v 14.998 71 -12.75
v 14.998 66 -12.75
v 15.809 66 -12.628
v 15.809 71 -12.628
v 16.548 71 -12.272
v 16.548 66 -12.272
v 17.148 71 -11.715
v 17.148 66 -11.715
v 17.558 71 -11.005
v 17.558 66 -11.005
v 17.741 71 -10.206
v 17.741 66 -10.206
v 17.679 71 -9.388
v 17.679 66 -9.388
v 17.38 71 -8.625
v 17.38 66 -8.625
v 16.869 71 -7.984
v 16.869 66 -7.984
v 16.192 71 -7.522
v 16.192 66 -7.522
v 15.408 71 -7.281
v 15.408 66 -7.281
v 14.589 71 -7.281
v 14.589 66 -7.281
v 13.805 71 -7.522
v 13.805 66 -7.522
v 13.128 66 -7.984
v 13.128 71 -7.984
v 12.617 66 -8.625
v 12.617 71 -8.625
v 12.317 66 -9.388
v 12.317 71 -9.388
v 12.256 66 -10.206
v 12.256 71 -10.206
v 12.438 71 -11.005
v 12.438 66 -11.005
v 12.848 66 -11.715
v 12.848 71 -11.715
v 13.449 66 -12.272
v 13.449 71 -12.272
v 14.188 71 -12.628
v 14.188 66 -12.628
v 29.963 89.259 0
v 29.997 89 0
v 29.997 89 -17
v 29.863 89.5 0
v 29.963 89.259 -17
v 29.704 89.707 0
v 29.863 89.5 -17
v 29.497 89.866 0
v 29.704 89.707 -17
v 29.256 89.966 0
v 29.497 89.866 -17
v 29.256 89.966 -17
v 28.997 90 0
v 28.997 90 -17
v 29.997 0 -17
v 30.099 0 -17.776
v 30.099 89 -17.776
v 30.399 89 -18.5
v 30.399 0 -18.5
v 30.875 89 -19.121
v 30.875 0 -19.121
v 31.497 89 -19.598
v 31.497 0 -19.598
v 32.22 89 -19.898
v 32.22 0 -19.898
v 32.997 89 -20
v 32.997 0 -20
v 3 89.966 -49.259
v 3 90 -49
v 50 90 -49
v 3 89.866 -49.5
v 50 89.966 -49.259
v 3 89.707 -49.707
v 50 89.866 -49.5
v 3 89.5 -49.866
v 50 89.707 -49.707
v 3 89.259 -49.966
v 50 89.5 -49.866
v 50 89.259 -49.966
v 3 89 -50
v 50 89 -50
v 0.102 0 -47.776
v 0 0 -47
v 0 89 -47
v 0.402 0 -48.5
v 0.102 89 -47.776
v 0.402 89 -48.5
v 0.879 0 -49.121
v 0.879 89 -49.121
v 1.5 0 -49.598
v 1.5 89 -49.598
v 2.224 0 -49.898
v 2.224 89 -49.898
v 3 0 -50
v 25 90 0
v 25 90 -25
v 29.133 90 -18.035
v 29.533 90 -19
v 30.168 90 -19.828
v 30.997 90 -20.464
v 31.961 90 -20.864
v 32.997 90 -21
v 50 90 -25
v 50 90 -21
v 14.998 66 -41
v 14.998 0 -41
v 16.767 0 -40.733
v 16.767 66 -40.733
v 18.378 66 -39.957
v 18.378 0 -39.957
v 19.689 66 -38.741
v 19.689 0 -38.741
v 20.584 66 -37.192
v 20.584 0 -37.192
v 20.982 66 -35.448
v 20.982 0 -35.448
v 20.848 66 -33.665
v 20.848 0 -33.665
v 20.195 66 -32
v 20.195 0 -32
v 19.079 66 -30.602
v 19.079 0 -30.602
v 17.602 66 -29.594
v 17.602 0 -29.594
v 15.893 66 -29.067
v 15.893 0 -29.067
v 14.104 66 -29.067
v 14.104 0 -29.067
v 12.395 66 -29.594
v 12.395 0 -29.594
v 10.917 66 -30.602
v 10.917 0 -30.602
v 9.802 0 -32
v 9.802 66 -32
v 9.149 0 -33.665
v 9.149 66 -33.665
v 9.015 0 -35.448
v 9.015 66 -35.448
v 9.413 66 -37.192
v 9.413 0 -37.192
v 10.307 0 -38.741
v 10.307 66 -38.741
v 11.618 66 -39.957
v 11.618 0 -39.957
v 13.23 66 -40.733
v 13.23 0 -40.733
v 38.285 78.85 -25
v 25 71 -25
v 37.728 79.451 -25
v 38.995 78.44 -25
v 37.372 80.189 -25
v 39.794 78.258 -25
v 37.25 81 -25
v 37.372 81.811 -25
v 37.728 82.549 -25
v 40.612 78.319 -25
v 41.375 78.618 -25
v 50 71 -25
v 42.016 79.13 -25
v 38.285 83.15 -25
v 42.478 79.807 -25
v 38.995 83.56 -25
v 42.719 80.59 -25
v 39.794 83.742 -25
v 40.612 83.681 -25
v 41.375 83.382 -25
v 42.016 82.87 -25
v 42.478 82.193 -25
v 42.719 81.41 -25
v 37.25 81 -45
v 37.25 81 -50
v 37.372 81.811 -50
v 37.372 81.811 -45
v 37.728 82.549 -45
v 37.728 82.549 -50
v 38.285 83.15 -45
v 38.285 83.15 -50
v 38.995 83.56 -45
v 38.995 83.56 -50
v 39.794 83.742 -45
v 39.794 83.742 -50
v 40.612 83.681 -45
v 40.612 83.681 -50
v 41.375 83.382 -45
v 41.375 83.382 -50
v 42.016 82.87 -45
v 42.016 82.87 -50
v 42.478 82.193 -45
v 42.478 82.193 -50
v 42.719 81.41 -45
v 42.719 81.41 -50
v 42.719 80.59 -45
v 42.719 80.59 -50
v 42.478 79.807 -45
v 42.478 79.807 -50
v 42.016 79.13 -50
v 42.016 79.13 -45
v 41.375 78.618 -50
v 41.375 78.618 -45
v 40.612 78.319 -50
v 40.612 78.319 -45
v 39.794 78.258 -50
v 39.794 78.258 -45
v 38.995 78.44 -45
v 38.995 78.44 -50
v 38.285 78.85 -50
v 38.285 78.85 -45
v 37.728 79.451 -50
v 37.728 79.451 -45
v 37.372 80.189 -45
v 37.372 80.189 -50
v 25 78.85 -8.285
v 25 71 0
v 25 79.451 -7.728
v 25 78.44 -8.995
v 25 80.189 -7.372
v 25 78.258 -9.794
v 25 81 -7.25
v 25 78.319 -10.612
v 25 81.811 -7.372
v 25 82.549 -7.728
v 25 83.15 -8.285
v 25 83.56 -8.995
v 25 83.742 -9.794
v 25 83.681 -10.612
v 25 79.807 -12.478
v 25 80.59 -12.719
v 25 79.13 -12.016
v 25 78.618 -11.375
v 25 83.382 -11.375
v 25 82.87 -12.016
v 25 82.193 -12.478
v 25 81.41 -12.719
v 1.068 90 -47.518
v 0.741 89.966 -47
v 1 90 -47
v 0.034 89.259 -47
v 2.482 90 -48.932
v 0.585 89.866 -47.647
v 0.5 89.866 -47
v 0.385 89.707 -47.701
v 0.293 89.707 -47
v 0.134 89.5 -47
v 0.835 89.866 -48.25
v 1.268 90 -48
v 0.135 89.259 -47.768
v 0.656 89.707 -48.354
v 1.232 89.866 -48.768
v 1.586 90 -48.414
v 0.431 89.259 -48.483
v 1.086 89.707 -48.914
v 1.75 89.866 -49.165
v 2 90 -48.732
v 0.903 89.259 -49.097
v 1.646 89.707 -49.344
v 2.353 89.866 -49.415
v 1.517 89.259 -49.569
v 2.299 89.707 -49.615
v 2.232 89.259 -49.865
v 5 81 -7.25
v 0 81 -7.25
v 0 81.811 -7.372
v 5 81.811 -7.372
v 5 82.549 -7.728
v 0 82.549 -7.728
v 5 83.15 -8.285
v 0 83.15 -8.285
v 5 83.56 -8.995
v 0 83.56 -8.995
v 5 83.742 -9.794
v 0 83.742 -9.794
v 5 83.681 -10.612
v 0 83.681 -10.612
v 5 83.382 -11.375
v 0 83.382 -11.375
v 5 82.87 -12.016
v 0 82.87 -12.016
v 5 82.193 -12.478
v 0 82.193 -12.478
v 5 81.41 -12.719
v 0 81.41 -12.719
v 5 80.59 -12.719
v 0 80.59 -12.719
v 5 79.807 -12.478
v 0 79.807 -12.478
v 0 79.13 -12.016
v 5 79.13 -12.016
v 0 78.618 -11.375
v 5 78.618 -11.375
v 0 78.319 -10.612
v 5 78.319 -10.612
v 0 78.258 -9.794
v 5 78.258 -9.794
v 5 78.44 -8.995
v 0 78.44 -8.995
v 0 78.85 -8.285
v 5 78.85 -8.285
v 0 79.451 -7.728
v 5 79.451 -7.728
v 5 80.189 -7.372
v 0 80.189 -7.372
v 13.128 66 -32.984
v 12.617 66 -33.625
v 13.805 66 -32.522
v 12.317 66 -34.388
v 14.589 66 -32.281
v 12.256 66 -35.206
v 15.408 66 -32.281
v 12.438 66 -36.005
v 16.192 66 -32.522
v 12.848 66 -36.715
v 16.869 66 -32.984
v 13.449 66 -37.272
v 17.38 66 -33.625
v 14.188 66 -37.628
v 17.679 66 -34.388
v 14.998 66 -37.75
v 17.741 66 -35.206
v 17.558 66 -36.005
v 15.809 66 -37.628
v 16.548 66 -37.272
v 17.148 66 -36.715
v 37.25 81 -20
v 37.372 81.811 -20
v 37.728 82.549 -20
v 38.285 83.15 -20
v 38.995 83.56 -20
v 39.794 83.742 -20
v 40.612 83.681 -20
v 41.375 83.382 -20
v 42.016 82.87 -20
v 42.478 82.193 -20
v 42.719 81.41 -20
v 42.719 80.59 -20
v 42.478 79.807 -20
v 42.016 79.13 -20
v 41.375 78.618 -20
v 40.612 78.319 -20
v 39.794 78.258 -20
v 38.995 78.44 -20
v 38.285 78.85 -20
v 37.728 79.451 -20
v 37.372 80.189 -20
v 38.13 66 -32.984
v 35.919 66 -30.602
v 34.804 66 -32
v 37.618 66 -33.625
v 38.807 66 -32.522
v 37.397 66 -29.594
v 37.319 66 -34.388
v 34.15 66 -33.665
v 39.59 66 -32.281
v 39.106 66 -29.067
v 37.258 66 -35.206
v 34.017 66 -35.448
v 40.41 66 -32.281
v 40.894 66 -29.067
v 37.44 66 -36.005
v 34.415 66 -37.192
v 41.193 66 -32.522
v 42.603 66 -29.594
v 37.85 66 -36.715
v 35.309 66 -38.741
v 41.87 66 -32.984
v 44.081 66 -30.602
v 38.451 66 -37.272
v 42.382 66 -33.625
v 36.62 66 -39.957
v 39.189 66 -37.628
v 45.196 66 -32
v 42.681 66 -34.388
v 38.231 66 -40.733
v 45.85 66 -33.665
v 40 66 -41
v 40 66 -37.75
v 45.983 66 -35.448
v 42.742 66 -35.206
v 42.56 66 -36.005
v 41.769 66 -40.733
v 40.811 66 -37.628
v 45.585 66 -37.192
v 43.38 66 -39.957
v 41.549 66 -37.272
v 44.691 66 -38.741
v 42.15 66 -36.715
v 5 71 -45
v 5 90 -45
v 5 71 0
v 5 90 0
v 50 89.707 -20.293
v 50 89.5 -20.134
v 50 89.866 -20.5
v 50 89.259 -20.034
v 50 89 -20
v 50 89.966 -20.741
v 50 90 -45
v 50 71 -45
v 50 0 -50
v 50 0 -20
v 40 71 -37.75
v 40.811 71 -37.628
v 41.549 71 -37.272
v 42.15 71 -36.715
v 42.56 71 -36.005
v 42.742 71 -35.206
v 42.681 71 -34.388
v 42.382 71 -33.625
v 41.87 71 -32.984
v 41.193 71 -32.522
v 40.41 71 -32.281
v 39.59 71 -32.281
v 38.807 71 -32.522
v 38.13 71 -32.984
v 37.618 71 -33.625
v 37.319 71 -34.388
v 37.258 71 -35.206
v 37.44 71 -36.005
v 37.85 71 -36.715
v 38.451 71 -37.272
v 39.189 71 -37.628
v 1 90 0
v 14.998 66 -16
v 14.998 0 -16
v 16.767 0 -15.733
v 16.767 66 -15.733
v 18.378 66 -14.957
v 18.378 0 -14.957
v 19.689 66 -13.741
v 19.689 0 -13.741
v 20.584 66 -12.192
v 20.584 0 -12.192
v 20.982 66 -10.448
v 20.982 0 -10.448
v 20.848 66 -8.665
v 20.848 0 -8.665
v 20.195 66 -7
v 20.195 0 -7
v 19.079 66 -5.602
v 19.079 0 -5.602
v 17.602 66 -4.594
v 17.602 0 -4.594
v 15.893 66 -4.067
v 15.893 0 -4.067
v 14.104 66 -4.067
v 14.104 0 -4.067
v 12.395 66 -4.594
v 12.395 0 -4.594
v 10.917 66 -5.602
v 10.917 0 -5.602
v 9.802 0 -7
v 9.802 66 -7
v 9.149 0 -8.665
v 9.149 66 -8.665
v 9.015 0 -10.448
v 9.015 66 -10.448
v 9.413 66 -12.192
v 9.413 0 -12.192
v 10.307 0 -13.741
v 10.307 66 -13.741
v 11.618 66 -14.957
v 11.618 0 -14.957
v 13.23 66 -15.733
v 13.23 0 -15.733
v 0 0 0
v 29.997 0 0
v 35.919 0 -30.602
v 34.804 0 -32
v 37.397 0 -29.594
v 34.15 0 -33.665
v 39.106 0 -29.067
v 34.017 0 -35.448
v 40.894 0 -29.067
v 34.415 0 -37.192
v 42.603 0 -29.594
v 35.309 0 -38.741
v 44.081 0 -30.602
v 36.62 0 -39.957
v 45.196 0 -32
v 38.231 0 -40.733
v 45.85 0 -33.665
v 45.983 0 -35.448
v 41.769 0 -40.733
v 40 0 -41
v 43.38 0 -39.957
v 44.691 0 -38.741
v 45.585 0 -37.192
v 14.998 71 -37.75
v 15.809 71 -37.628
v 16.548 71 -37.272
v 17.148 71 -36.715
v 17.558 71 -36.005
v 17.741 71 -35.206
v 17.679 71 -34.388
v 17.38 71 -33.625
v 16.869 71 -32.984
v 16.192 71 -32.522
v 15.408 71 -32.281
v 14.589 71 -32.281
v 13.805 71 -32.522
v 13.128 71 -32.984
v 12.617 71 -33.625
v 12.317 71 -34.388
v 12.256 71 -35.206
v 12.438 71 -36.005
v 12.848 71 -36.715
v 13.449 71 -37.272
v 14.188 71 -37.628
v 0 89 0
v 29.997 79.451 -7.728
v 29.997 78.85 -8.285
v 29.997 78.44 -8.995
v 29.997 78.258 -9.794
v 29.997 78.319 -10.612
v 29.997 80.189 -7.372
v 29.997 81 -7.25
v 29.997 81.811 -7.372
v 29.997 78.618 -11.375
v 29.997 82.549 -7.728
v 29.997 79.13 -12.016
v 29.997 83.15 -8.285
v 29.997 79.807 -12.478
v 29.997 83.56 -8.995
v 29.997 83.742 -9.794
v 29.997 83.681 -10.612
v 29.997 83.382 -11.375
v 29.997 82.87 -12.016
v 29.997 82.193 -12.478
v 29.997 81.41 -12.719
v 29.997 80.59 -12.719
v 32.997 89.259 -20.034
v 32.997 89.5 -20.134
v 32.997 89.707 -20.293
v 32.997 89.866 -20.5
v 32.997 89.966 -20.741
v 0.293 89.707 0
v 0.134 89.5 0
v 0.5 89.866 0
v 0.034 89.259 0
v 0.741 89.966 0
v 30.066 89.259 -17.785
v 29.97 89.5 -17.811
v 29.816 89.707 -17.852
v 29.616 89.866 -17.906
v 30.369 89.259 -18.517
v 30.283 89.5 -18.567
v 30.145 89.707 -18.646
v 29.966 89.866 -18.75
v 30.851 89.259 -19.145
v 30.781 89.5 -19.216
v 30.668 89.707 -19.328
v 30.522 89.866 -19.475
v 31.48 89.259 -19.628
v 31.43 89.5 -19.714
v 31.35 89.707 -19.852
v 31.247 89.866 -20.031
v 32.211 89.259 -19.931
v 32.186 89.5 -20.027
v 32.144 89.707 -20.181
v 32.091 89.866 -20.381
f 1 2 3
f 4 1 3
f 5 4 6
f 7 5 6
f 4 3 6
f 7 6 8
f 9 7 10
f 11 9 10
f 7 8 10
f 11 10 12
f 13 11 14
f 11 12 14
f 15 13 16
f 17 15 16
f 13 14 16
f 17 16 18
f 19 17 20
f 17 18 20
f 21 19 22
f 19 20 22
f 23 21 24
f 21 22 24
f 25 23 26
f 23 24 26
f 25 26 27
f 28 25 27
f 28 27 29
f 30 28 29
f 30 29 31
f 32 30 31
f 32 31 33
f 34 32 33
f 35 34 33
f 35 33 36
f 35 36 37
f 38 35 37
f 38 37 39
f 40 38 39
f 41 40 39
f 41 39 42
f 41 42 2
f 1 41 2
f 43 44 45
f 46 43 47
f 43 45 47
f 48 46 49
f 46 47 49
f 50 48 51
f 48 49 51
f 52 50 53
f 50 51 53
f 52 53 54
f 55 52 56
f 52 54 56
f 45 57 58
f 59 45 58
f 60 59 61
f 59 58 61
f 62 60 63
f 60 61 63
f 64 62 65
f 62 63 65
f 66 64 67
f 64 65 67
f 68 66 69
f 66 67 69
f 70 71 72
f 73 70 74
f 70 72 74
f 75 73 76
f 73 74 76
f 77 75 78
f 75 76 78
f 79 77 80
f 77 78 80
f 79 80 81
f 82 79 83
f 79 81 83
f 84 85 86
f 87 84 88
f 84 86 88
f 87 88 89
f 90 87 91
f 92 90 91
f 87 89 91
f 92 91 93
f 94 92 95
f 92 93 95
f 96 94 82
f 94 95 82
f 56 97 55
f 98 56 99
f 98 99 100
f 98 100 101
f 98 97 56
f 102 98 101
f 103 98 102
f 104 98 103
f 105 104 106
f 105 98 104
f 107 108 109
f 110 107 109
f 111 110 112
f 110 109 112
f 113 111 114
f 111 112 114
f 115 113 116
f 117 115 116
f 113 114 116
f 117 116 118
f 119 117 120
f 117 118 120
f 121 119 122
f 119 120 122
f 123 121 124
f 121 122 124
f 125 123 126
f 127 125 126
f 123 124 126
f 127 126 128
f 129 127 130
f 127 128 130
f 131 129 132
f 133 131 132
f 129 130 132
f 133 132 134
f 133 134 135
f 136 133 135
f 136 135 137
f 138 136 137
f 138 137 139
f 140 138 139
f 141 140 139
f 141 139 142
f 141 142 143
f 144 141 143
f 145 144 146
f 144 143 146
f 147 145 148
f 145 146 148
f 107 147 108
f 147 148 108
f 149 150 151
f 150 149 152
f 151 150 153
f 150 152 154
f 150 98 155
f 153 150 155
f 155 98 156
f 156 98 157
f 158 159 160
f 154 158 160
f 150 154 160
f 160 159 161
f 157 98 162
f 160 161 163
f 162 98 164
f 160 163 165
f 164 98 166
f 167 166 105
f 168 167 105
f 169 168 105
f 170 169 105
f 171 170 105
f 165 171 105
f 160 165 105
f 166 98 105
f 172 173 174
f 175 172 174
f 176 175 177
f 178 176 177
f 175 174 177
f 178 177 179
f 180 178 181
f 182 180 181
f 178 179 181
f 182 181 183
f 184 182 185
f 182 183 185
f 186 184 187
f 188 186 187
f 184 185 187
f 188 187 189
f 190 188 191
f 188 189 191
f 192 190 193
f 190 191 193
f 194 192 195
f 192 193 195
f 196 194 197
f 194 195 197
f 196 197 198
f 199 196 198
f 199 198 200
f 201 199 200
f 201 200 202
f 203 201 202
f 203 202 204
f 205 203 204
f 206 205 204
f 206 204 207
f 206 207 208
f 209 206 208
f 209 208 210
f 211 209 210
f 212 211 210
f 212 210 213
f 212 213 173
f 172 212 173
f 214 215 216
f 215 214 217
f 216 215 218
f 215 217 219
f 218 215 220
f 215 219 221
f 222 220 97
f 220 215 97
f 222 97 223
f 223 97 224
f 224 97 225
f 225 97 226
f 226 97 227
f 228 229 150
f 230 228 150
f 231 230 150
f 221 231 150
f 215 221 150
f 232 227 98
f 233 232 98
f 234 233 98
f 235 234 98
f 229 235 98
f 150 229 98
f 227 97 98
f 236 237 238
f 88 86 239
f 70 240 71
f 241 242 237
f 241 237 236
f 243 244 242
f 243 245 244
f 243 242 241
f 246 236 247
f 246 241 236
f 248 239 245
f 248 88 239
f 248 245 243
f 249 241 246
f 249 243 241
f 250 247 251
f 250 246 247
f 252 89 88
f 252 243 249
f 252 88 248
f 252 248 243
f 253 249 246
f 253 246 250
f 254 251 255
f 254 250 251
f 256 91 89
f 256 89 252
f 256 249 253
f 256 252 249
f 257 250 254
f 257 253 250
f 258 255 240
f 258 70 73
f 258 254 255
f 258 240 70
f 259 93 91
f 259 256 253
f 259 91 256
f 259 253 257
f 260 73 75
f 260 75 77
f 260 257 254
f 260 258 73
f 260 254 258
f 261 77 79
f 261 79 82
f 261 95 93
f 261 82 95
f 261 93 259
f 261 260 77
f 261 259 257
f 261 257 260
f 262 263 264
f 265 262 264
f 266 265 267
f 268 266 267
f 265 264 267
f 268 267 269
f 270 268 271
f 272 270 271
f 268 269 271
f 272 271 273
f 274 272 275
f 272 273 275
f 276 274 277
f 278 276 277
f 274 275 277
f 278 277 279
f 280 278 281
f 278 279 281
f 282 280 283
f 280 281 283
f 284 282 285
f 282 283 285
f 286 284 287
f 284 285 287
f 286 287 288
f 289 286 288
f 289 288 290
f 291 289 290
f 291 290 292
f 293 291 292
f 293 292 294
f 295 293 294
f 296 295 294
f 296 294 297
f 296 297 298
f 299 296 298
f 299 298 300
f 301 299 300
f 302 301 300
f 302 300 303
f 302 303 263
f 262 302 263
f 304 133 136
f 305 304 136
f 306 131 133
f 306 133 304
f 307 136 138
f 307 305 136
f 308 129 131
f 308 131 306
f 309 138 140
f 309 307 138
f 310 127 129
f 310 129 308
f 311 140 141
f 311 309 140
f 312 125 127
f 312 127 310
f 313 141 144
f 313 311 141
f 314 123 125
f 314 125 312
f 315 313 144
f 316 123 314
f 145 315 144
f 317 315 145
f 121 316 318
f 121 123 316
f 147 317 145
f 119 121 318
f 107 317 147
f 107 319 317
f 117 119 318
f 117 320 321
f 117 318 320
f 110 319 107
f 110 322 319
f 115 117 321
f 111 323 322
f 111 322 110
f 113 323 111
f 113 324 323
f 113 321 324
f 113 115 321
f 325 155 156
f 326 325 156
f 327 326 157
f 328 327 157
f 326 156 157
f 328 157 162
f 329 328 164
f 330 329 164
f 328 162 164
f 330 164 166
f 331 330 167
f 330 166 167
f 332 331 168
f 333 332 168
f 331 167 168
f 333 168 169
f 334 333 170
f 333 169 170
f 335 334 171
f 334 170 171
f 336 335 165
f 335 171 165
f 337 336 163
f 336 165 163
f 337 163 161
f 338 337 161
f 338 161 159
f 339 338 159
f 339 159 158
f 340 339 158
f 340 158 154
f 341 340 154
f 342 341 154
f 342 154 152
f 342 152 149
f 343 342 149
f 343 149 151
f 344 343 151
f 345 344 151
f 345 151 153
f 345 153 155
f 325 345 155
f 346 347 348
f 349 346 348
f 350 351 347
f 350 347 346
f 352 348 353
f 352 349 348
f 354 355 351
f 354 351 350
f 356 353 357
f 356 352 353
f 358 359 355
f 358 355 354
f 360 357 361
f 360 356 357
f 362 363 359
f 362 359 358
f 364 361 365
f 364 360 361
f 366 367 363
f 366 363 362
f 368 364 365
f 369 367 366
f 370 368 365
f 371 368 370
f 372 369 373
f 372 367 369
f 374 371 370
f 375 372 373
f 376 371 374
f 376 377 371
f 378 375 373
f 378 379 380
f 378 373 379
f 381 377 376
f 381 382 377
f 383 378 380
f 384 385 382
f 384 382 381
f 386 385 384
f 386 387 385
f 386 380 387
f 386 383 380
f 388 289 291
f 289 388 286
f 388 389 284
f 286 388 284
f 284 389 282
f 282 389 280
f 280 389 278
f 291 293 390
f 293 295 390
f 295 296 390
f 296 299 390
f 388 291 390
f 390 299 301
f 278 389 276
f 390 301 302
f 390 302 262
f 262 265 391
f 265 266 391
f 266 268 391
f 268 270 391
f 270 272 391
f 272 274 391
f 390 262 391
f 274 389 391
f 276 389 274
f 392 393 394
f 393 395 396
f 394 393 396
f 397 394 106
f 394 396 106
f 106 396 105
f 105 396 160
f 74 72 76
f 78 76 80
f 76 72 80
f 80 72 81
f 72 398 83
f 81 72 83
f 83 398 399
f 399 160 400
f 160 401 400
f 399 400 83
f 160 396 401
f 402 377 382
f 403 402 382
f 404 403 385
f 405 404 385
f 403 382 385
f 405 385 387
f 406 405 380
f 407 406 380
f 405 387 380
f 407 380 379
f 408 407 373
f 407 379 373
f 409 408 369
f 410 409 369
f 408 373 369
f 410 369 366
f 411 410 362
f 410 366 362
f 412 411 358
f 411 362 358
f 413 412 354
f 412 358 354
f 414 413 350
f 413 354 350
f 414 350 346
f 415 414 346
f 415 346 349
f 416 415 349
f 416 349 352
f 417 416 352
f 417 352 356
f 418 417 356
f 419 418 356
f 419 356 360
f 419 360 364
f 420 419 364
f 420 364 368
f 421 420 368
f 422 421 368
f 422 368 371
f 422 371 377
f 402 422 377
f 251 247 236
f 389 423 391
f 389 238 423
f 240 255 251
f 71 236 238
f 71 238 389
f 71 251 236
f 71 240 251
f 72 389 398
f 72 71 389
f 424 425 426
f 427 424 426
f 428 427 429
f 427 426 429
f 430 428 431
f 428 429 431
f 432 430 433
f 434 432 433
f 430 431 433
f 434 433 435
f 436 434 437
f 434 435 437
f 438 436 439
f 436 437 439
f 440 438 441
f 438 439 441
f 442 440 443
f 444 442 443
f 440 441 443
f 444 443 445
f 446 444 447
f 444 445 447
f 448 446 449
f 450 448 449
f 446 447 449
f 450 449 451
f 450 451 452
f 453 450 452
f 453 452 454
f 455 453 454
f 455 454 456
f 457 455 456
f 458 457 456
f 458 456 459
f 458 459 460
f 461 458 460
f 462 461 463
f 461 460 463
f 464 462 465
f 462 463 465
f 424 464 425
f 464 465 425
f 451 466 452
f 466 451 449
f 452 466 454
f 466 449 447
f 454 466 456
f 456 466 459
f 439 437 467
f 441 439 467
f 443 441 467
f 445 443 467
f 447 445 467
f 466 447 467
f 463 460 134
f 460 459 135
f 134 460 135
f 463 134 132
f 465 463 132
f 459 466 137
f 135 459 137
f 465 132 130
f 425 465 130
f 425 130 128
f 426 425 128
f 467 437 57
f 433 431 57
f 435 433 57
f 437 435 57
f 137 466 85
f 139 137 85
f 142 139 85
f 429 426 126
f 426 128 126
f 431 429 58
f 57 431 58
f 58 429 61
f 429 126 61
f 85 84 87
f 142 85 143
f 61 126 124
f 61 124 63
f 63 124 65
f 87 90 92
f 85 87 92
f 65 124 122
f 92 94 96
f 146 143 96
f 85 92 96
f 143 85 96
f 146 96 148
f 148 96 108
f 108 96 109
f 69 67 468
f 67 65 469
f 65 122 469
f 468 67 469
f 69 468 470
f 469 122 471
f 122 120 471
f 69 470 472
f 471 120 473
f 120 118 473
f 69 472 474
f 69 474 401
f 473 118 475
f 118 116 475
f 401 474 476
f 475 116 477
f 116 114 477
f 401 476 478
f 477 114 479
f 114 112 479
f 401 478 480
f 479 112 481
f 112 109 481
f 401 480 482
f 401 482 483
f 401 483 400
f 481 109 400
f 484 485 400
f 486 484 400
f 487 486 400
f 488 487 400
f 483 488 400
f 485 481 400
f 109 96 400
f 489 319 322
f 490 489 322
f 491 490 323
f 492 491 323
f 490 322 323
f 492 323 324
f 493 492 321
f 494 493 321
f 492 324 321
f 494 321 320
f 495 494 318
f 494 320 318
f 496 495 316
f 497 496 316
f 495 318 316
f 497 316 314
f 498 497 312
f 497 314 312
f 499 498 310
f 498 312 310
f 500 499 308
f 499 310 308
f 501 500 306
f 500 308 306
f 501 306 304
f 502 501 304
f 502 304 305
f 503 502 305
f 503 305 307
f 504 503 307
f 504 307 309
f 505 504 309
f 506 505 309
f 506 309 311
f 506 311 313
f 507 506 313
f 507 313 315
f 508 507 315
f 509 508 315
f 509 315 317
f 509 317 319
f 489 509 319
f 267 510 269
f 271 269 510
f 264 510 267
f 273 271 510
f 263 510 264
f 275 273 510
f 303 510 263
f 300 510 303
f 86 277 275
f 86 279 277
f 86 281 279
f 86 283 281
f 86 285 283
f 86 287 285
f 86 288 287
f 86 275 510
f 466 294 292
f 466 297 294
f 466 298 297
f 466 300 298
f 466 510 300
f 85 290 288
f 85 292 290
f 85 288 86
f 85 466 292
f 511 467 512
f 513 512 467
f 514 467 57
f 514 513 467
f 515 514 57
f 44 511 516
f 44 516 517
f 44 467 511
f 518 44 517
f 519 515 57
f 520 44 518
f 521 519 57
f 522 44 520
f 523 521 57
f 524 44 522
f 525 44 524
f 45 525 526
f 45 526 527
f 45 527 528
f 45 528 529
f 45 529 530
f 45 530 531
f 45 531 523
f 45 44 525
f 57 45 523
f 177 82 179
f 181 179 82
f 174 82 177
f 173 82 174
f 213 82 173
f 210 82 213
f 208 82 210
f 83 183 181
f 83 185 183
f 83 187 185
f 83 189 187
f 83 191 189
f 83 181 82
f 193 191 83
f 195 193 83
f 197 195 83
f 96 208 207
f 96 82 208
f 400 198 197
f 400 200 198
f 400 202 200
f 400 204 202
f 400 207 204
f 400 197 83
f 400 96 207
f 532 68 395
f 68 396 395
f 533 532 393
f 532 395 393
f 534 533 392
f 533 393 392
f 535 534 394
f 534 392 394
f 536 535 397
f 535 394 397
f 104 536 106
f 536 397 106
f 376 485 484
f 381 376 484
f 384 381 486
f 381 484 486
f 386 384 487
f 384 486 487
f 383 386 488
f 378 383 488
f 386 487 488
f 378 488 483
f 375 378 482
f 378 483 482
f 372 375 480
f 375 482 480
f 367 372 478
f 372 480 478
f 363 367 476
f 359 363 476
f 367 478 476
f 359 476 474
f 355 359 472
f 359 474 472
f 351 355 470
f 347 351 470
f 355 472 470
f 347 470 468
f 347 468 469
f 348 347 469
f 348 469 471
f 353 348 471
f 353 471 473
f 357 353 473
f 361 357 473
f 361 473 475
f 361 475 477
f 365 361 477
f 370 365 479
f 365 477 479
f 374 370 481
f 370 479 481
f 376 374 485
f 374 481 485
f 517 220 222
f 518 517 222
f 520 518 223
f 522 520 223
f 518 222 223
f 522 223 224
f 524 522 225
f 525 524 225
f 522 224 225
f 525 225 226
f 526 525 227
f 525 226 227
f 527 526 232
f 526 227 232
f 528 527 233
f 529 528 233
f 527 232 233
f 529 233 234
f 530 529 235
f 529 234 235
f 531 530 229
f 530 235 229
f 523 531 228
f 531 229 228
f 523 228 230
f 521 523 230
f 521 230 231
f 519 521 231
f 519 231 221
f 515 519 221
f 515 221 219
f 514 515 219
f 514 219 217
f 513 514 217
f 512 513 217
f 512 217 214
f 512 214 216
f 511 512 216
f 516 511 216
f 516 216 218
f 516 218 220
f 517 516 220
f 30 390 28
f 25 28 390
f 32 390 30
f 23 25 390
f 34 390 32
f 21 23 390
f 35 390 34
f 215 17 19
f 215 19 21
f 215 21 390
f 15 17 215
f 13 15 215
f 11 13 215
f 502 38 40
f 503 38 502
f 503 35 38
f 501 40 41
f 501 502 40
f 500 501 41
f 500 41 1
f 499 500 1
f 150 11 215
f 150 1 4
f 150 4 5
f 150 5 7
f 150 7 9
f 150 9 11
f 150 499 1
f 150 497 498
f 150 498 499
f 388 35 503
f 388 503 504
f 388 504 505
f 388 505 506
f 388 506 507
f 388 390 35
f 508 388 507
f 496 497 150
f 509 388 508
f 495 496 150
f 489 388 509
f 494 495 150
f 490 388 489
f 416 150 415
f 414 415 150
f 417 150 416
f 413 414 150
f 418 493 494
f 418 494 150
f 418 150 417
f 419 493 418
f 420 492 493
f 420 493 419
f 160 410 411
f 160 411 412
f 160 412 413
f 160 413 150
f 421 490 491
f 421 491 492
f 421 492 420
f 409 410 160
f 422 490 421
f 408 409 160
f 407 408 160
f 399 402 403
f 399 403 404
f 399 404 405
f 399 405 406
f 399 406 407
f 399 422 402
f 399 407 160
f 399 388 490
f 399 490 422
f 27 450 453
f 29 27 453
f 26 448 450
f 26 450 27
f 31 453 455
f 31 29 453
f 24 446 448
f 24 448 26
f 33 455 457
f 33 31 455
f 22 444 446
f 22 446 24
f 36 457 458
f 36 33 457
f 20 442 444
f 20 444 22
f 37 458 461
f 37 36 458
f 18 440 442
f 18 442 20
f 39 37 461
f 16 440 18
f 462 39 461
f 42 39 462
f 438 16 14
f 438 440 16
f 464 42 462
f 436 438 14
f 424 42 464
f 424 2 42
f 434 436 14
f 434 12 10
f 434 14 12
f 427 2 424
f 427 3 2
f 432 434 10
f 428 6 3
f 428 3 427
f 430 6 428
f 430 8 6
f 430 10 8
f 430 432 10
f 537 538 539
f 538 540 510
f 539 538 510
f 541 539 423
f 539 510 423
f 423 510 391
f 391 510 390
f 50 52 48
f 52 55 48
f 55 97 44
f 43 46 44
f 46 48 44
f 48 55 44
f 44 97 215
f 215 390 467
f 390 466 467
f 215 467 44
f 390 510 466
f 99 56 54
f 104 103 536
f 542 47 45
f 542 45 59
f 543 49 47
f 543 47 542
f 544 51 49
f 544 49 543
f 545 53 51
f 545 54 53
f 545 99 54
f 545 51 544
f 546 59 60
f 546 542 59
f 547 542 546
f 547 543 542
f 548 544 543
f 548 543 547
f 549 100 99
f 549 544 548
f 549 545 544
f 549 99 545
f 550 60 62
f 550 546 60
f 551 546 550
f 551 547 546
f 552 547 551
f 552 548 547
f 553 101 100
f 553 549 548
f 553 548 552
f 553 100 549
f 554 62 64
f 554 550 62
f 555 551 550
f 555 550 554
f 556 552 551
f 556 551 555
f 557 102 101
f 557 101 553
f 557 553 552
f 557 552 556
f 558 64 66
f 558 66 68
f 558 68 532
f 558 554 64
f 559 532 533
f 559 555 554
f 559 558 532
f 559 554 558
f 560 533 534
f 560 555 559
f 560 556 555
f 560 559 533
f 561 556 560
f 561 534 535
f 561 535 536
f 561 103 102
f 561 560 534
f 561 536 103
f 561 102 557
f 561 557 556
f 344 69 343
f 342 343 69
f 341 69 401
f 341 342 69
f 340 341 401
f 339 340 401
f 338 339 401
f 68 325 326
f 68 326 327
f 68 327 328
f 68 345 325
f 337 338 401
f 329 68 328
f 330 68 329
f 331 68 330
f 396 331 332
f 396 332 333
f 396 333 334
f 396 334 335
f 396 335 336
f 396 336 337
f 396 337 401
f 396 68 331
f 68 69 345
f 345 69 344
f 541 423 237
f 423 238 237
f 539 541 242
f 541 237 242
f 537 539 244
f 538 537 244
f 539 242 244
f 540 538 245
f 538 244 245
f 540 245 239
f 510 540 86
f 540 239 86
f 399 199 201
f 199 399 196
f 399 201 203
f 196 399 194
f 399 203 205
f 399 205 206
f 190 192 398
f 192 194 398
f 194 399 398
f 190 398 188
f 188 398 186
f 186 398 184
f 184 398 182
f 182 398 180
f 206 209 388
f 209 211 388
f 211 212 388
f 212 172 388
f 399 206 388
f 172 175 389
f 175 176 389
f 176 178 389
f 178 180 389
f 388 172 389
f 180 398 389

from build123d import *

# Parameters (mm, degrees)
SKETCH1_W           = 50
SKETCH1_H           = 50
BOSS_EXTRUDE1_DEPTH = 90
CUT_EXTRUDE1_DEPTH  = 19
SKETCH3_W           = 20.00325309
SKETCH3_H           = 20
CUT_EXTRUDE2_DEPTH  = 115.455231423
SKETCH4_R           = 6
CUT_EXTRUDE3_DEPTH  = 66
SKETCH6_R           = 2.75
CUT_EXTRUDE4_DEPTH  = 97.726418315
SKETCH7_R           = 2.75
CUT_EXTRUDE5_DEPTH  = 115.455231423
SKETCH8_R           = 2.75
CUT_EXTRUDE6_DEPTH  = 115.455231423
FILLET1_R           = 3
FILLET2_R           = 1


with BuildPart() as part:
    # Sketch1 → Boss-Extrude1 (new body)
    with BuildSketch(Plane(origin=(0, 0, 0), x_dir=(1, 0, 0), z_dir=(0, 1, 0))):
        with Locations((25, 25)):
            Rectangle(SKETCH1_W, SKETCH1_H)
    extrude(amount=BOSS_EXTRUDE1_DEPTH)

    # Sketch2 → Cut-Extrude1 (cut)
    with BuildSketch(Plane(origin=(0, 90, 0), x_dir=(1, 0, 0), z_dir=(0, 1, 0))):
        Polygon((5, 0), (25, 0), (25, 25), (50, 25), (50, 45), (5, 45), align=None)
    extrude(amount=-CUT_EXTRUDE1_DEPTH, mode=Mode.SUBTRACT)

    # Sketch3 → Cut-Extrude2 (cut, through all)
    with BuildSketch(Plane(origin=(0, 90, 0), x_dir=(1, 0, 0), z_dir=(0, 1, 0))):
        with Locations((39.998373455, 10)):
            Rectangle(SKETCH3_W, SKETCH3_H)
    extrude(amount=-CUT_EXTRUDE2_DEPTH, mode=Mode.SUBTRACT)

    # Sketch4 → Cut-Extrude3 (cut)
    with BuildSketch(Plane.XZ):
        with Locations(Location((14.998373455, -10, 0), (0, 0, 270))):
            Circle(SKETCH4_R)
        with Locations(Location((40, -35, 0), (0, 0, 270))):
            Circle(SKETCH4_R)
        with Locations(Location((14.998373455, -35, 0), (0, 0, 270))):
            Circle(SKETCH4_R)
    extrude(amount=-CUT_EXTRUDE3_DEPTH, mode=Mode.SUBTRACT)

    # Sketch6 → Cut-Extrude4 (cut, through all)
    with BuildSketch(Plane.XZ.offset(-66)):
        with Locations(Location((14.998373455, -10, 0), (0, 0, 270))):
            Circle(SKETCH6_R)
        with Locations(Location((40, -35, 0), (0, 0, 270))):
            Circle(SKETCH6_R)
        with Locations(Location((14.998373455, -35, 0), (0, 0, 270))):
            Circle(SKETCH6_R)
    extrude(amount=-CUT_EXTRUDE4_DEPTH, mode=Mode.SUBTRACT)

    # Sketch7 → Cut-Extrude5 (cut, through all)
    with BuildSketch(Plane.ZY):
        with Locations((-10, 81)):
            Circle(SKETCH7_R)
    extrude(amount=-CUT_EXTRUDE5_DEPTH, mode=Mode.SUBTRACT)

    # Sketch8 → Cut-Extrude6 (cut, through all)
    with BuildSketch(Plane(origin=(0, 0, -50), x_dir=(-1, 0, 0), z_dir=(0, 0, -1))):
        with Locations((-40, 81)):
            Circle(SKETCH8_R)
    extrude(amount=-CUT_EXTRUDE6_DEPTH, mode=Mode.SUBTRACT)

    # Fillet1
    fillet1_edges = [part.edges().sort_by_distance(p)[0] for p in [
        (29.99674691, 45, -20),
        (0, 45, -50),
    ]]
    fillet(fillet1_edges, radius=FILLET1_R)

    # Fillet2
    fillet2_edges = [part.edges().sort_by_distance(p)[0] for p in [
        (30.875426566, 90, -19.121320344),
        (26.5, 90, -50),
        (41.498373455, 90, -20),
        (29.99674691, 90, -8.5),
        (0, 90, -23.5),
        (0.878679656, 90, -49.121320344),
    ]]
    fillet(fillet2_edges, radius=FILLET2_R)


solid = part.part
